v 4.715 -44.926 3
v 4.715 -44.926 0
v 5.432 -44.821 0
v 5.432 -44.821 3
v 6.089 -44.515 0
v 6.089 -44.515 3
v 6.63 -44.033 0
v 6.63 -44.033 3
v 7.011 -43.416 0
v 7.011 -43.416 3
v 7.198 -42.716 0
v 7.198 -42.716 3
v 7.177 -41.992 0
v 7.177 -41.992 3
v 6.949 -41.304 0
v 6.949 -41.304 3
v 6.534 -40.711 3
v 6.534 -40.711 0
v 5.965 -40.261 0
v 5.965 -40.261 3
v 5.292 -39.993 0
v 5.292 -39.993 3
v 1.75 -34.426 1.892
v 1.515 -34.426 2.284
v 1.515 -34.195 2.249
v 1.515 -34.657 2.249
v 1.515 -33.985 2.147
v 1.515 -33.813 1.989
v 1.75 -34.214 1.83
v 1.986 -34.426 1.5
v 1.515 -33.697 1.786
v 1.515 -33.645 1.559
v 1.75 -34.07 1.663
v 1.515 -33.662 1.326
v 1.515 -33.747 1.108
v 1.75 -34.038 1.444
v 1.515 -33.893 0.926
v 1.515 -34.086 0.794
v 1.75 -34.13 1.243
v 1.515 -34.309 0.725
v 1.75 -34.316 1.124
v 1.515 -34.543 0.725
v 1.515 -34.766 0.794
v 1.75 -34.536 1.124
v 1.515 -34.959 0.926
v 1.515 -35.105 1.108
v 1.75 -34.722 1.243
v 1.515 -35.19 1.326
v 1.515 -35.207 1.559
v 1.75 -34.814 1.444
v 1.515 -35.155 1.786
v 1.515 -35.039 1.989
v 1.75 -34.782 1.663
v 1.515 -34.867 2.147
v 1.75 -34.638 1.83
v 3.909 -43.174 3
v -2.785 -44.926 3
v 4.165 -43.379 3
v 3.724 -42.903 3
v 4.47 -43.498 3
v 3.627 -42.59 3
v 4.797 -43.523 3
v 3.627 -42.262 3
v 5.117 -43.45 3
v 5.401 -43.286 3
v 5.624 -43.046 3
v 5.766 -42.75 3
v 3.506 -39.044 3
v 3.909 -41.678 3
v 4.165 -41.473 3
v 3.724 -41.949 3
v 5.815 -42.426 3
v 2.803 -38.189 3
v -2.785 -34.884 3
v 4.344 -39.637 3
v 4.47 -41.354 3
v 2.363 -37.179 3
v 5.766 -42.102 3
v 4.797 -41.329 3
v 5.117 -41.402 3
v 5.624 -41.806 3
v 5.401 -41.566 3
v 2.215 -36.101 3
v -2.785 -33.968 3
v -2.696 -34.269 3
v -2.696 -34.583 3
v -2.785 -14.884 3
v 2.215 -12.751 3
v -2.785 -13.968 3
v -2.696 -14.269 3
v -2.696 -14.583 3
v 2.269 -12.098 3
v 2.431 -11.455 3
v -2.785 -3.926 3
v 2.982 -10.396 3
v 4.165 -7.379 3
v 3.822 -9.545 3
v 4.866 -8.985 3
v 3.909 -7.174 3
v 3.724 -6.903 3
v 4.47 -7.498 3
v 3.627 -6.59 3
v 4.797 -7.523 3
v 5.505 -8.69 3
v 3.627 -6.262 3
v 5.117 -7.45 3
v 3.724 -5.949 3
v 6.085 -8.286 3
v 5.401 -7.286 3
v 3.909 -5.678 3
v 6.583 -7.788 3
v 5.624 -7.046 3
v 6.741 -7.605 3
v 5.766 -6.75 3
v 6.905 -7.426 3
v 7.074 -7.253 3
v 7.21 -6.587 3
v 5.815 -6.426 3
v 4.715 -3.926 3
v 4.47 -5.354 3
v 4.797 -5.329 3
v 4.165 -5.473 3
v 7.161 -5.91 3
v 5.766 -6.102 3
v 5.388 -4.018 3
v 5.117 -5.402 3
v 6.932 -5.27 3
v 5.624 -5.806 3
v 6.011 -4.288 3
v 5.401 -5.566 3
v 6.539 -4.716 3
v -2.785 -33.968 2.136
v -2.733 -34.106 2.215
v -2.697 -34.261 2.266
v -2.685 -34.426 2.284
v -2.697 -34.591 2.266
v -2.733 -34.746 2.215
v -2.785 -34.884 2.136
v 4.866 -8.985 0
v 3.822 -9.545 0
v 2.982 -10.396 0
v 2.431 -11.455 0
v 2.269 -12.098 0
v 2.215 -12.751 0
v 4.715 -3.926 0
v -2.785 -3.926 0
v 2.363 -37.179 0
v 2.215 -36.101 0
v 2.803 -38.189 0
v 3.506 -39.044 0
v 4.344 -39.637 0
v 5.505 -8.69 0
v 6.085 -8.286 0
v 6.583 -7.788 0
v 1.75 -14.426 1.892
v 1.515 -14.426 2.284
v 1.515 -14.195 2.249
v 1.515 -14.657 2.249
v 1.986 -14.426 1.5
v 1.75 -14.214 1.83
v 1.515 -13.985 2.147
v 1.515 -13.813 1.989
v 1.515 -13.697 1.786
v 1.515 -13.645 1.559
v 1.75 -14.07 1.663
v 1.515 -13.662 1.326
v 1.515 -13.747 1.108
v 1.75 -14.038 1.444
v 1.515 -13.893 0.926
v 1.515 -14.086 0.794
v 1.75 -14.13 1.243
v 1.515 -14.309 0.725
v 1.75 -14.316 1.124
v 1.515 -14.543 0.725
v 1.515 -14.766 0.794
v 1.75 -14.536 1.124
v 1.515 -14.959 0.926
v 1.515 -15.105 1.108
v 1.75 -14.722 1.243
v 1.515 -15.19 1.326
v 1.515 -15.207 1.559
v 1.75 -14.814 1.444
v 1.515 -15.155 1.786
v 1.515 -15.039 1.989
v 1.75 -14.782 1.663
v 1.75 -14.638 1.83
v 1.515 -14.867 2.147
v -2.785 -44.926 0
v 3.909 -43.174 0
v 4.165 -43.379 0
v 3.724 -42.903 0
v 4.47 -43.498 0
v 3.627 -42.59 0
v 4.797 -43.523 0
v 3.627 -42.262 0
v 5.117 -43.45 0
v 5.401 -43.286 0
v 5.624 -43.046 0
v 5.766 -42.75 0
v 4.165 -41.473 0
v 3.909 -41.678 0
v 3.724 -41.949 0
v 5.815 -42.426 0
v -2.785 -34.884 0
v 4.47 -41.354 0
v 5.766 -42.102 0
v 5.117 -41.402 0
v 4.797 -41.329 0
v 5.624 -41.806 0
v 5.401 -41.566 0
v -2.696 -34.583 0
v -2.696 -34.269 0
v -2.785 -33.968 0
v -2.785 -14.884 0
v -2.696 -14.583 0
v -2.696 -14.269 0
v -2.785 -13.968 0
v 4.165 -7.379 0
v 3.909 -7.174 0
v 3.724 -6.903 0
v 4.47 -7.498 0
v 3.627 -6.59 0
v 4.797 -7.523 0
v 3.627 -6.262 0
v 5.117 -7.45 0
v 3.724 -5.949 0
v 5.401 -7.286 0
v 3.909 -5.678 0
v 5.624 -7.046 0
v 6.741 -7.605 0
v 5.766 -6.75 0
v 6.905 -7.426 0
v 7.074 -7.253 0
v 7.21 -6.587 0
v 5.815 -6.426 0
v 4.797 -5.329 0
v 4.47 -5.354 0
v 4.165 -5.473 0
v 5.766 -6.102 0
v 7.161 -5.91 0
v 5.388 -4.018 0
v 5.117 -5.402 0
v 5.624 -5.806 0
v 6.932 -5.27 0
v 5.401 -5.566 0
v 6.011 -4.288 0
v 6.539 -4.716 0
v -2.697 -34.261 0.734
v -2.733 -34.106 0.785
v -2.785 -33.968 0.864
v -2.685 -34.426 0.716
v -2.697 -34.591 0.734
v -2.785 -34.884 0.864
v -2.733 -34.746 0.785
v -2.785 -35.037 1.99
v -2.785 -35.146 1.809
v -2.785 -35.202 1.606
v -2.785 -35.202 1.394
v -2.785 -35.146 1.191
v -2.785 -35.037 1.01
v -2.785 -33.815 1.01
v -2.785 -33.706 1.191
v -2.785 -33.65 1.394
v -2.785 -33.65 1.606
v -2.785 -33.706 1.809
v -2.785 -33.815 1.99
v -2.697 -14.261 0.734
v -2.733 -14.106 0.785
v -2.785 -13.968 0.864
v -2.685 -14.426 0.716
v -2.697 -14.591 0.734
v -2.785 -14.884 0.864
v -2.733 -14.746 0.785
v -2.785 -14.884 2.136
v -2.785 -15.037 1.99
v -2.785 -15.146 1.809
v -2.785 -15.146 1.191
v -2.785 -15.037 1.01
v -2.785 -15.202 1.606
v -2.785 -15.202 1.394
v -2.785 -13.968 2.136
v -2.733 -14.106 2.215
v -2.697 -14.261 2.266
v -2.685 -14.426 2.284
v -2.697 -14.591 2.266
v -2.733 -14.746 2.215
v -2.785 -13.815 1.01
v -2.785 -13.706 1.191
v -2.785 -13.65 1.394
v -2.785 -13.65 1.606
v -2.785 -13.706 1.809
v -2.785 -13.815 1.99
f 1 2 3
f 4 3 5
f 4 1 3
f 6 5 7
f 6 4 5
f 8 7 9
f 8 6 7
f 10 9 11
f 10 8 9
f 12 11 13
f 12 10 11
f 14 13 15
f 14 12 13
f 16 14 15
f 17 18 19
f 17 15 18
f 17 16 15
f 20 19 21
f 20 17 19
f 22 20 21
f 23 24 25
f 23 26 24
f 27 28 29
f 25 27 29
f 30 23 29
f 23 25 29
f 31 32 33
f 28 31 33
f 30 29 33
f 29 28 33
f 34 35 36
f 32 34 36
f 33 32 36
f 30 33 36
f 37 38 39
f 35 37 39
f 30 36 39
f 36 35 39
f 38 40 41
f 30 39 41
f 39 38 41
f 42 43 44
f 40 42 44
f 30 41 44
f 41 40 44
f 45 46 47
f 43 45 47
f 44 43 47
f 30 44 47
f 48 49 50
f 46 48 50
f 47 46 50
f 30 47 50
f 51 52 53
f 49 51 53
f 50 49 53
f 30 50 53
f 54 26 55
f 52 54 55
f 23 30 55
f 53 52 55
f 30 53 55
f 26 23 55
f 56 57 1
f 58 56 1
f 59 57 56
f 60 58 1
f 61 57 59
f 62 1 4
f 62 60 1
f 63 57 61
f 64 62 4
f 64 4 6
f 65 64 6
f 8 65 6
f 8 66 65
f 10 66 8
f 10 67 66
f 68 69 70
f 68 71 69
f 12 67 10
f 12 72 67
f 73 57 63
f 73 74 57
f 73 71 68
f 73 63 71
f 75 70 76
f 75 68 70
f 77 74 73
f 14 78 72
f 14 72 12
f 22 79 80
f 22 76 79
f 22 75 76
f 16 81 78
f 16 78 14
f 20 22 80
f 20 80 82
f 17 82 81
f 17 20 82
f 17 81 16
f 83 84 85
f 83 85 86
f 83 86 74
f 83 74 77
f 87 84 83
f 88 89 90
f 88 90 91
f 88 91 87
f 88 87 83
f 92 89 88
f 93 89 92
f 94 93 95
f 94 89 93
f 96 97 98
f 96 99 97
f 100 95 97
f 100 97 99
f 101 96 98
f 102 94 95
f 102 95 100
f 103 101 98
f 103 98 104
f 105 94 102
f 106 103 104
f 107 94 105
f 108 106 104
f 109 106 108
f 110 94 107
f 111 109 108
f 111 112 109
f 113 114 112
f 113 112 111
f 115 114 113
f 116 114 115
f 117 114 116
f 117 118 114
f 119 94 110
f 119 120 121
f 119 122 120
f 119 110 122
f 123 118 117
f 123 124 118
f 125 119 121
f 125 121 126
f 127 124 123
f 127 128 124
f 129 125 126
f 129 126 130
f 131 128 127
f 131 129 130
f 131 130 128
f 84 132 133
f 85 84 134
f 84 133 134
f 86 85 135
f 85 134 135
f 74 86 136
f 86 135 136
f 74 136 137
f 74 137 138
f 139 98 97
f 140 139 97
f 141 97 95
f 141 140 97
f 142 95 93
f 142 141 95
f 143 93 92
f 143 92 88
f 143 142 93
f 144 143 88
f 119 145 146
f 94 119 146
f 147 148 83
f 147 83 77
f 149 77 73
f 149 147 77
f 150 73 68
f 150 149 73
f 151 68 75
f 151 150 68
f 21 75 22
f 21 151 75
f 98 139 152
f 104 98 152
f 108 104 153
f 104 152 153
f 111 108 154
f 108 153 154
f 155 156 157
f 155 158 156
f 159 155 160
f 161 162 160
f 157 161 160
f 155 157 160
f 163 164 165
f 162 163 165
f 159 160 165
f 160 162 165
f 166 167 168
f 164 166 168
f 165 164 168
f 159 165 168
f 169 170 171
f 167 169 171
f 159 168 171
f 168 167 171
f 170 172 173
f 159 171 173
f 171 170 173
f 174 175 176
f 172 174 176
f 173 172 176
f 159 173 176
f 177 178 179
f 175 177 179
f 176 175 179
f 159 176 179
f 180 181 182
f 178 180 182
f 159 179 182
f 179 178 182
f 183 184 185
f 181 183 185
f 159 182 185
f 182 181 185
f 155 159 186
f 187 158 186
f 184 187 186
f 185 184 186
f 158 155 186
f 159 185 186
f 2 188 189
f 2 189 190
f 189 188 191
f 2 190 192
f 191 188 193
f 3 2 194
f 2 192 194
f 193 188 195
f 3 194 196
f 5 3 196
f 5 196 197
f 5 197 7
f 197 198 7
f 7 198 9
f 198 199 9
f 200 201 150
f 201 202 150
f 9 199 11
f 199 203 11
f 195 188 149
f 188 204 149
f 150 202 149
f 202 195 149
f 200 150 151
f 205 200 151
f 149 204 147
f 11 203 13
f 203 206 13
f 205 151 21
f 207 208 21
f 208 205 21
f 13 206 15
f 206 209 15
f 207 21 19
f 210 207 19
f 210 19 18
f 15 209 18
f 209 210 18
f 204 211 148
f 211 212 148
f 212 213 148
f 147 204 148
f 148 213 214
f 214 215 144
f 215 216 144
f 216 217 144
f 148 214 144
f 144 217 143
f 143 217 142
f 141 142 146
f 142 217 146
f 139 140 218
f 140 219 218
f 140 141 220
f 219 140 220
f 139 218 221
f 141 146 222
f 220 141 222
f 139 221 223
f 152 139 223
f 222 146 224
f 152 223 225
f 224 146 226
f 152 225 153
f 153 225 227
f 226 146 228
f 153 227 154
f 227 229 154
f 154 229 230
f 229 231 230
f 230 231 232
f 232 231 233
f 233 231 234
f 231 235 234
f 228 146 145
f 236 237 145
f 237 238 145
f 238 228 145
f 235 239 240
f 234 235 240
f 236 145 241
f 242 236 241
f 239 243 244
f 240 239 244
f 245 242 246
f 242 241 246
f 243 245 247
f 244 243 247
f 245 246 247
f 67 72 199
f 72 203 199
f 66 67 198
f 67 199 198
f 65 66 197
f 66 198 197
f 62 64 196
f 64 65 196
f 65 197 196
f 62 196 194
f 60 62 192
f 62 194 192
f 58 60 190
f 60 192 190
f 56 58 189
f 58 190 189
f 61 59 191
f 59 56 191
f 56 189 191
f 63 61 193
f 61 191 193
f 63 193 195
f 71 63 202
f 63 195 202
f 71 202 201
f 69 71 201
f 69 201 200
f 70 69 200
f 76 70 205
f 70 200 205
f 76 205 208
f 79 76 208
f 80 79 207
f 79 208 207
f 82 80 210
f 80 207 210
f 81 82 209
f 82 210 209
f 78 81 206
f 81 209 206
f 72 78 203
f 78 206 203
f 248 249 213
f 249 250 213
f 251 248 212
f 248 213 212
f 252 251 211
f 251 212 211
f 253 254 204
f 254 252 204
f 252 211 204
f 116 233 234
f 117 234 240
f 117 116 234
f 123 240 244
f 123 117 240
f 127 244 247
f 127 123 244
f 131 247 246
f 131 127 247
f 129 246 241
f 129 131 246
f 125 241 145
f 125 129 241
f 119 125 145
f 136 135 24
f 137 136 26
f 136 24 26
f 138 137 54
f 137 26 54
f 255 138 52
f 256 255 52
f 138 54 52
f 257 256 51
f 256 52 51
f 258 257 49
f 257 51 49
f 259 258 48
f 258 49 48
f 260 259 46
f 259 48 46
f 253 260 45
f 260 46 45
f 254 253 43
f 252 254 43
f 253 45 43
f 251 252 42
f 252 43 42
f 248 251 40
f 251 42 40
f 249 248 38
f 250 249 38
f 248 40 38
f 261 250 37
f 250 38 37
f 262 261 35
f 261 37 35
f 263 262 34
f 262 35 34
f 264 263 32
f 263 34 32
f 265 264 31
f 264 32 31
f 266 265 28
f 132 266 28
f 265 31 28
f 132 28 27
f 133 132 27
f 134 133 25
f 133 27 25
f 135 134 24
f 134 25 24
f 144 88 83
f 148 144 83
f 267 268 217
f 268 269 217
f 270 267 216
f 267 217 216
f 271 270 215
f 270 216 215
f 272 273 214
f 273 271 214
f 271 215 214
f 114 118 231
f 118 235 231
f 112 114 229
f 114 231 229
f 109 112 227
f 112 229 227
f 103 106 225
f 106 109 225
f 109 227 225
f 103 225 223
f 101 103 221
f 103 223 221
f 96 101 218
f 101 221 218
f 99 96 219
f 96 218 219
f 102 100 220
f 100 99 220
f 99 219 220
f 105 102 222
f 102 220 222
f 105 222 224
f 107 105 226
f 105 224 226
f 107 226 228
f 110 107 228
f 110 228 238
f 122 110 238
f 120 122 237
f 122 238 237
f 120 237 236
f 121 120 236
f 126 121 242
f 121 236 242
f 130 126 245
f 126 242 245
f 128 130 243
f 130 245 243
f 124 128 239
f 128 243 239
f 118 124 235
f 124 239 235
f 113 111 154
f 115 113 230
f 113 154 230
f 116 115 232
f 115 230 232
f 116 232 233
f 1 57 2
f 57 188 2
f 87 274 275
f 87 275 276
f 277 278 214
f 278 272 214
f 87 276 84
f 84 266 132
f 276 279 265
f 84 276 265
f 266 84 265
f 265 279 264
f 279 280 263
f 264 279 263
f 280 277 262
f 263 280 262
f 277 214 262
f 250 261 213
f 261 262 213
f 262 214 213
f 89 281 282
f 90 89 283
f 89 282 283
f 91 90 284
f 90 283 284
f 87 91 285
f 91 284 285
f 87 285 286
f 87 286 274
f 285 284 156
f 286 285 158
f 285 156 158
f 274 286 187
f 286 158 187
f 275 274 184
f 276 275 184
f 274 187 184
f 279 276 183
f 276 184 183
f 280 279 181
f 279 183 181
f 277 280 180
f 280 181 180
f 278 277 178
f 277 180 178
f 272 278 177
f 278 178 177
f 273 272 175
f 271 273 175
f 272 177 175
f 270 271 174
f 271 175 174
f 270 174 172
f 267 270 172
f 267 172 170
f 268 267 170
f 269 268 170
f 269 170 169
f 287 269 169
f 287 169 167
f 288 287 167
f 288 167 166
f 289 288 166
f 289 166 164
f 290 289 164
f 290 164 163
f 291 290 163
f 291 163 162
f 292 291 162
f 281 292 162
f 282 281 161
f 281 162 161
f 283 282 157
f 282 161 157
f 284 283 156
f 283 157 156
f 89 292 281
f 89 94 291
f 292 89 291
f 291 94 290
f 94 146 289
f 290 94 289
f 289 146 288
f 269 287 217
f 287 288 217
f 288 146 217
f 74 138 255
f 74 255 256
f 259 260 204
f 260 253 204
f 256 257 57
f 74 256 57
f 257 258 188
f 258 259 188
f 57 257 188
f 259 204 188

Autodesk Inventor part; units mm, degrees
ref_plane "YZ Plane" through (0, 0, 0) normal (1, 0, 0) x (0, 1, 0)
ref_plane "XZ Plane" through (0, 0, 0) normal (0, 1, 0) x (-1, 0, 0)
ref_plane "XY Plane" through (0, 0, 0) normal (0, 0, 1) x (1, 0, 0)
sketch "スケッチ1" plane through (0, 0, 0) normal (0, 0, 1) x (1, 0, 0)
  line L0 (22.7151, -43.926) -> (22.7151, -4.926) construction
  arc A0 (22.2151, -44.426) -> (22.7151, -43.926) centre (22.2151, -43.926) ccw construction
  line L1 (3.2151, -44.426) -> (22.2151, -44.426) construction
  arc A1 (2.7151, -43.926) -> (3.2151, -44.426) centre (3.2151, -43.926) ccw construction
  line L2 (2.7151, -4.926) -> (2.7151, -43.926) construction
  arc A2 (3.2151, -4.426) -> (2.7151, -4.926) centre (3.2151, -4.926) ccw construction
  line L3 (22.2151, -4.426) -> (3.2151, -4.426) construction
  arc A3 (22.7151, -4.926) -> (22.2151, -4.426) centre (22.2151, -4.926) ccw construction
  line L4 (6.2865, -24.2474) -> (6.2865, -30.6046) construction
  line L5 (6.2865, -30.6046) -> (10.1437, -30.6046) construction
  line L6 (10.1437, -30.6046) -> (10.1437, -24.2474) construction
  line L7 (10.1437, -24.2474) -> (6.2865, -24.2474) construction
  circle A4 centre (12.7151, -31.826) radius 1.1519 construction
  line L8 (19.1437, -24.2474) -> (15.2865, -24.2474) construction
  line L9 (15.2865, -24.2474) -> (15.2865, -30.6046) construction
  line L10 (15.2865, -30.6046) -> (19.1437, -30.6046) construction
  line L11 (19.1437, -30.6046) -> (19.1437, -24.2474) construction
  circle A5 centre (4.7151, -6.426) radius 1.8131 construction
  circle A6 centre (20.7151, -6.426) radius 1.8131 construction
  circle A7 centre (4.7151, -42.426) radius 1.8131 construction
  circle A8 centre (20.7151, -42.426) radius 1.8131 construction
  arc A9 (18.9651, -12.926) -> (6.4651, -12.9153) centre (12.7151, -12.926) ccw construction
  arc A10 (6.4649, -12.9153) -> (6.2151, -12.676) centre (6.2151, -12.926) ccw construction
  line L12 (6.2151, -12.676) -> (4.4651, -12.676) construction
  arc A11 (4.4651, -12.676) -> (4.4651, -13.176) centre (4.4651, -12.926) ccw construction
  line L13 (4.4651, -13.176) -> (6.2151, -13.176) construction
  arc A12 (6.2151, -13.176) -> (6.4651, -12.926) centre (6.2151, -12.926) ccw construction
  arc A13 (6.4651, -12.926) -> (6.9408, -15.3178) centre (12.7151, -12.926) ccw construction
  arc A14 (6.9408, -15.3178) -> (6.6142, -15.1825) centre (6.7099, -15.4134) ccw construction
  line L14 (6.6142, -15.1825) -> (4.9974, -15.8522) construction
  arc A15 (4.9974, -15.8522) -> (5.1888, -16.3141) centre (5.0931, -16.0831) ccw construction
  line L15 (5.1888, -16.3141) -> (6.8055, -15.6444) construction
  arc A16 (6.8055, -15.6444) -> (6.9408, -15.3178) centre (6.7099, -15.4134) ccw construction
  arc A17 (6.9408, -15.3178) -> (8.2957, -17.3454) centre (12.7151, -12.926) ccw construction
  arc A18 (8.2957, -17.3454) -> (7.9421, -17.3454) centre (8.1189, -17.5222) ccw construction
  line L16 (7.9421, -17.3454) -> (6.7047, -18.5829) construction
  arc A19 (6.7047, -18.5829) -> (7.0582, -18.9364) centre (6.8815, -18.7596) ccw construction
  line L17 (7.0582, -18.9364) -> (8.2957, -17.699) construction
  arc A20 (8.2957, -17.699) -> (8.2957, -17.3454) centre (8.1189, -17.5222) ccw construction
  arc A21 (8.2957, -17.3454) -> (10.3233, -18.7003) centre (12.7151, -12.926) ccw construction
  arc A22 (10.3233, -18.7003) -> (9.9967, -18.8356) centre (10.2277, -18.9312) ccw construction
  line L18 (9.9967, -18.8356) -> (9.327, -20.4523) construction
  arc A23 (9.327, -20.4523) -> (9.7889, -20.6437) centre (9.558, -20.548) ccw construction
  line L19 (9.7889, -20.6437) -> (10.4586, -19.0269) construction
  arc A24 (10.4586, -19.0269) -> (10.3233, -18.7003) centre (10.2277, -18.9312) ccw construction
  arc A25 (10.3233, -18.7003) -> (12.7151, -19.176) centre (12.7151, -12.926) ccw construction
  arc A26 (12.7151, -19.176) -> (12.4651, -19.426) centre (12.7151, -19.426) ccw construction
  line L20 (12.4651, -19.426) -> (12.4651, -21.176) construction
  arc A27 (12.4651, -21.176) -> (12.9651, -21.176) centre (12.7151, -21.176) ccw construction
  line L21 (12.9651, -21.176) -> (12.9651, -19.426) construction
  arc A28 (12.9651, -19.426) -> (12.7151, -19.176) centre (12.7151, -19.426) ccw construction
  arc A29 (12.7151, -19.176) -> (15.1069, -18.7003) centre (12.7151, -12.926) ccw construction
  arc A30 (15.1069, -18.7003) -> (14.9716, -19.0269) centre (15.2025, -18.9312) ccw construction
  line L22 (14.9716, -19.0269) -> (15.6413, -20.6437) construction
  arc A31 (15.6413, -20.6437) -> (16.1032, -20.4523) centre (15.8722, -20.548) ccw construction
  line L23 (16.1032, -20.4523) -> (15.4335, -18.8356) construction
  arc A32 (15.4335, -18.8356) -> (15.1069, -18.7003) centre (15.2025, -18.9312) ccw construction
  arc A33 (15.1069, -18.7003) -> (17.1345, -17.3454) centre (12.7151, -12.926) ccw construction
  arc A34 (17.1345, -17.3454) -> (17.1345, -17.699) centre (17.3113, -17.5222) ccw construction
  line L24 (17.1345, -17.699) -> (18.3719, -18.9364) construction
  arc A35 (18.3719, -18.9364) -> (18.7255, -18.5829) centre (18.5487, -18.7596) ccw construction
  line L25 (18.7255, -18.5829) -> (17.4881, -17.3454) construction
  arc A36 (17.4881, -17.3454) -> (17.1345, -17.3454) centre (17.3113, -17.5222) ccw construction
  arc A37 (17.1345, -17.3454) -> (18.4893, -15.3178) centre (12.7151, -12.926) ccw construction
  arc A38 (18.4893, -15.3178) -> (18.6246, -15.6444) centre (18.7203, -15.4134) ccw construction
  line L26 (18.6246, -15.6444) -> (20.2414, -16.3141) construction
  arc A39 (20.2414, -16.3141) -> (20.4328, -15.8522) centre (20.3371, -16.0831) ccw construction
  line L27 (20.4328, -15.8522) -> (18.816, -15.1825) construction
  arc A40 (18.816, -15.1825) -> (18.4893, -15.3178) centre (18.7203, -15.4134) ccw construction
  arc A41 (18.4893, -15.3178) -> (18.9651, -12.926) centre (12.7151, -12.926) ccw construction
  arc A42 (18.9651, -12.926) -> (19.2151, -13.176) centre (19.2151, -12.926) ccw construction
  line L28 (19.2151, -13.176) -> (20.9651, -13.176) construction
  arc A43 (20.9651, -13.176) -> (20.9651, -12.676) centre (20.9651, -12.926) ccw construction
  line L29 (20.9651, -12.676) -> (19.2151, -12.676) construction
  arc A44 (19.2151, -12.676) -> (18.9651, -12.926) centre (19.2151, -12.926) ccw construction
  circle A45 centre (4.7151, -6.426) radius 1.1
  circle A46 centre (4.7151, -42.426) radius 1.1
  circle A47 centre (4.7151, -6.426) radius 2.5
  circle A48 centre (4.7151, -42.426) radius 2.5
  circle A49 centre (12.7151, -12.926) radius 8 construction
  circle A50 centre (12.7151, -12.926) radius 8
  line L30 (12.1437, -22.2474) -> (12.1437, -32.6046)
  line L31 (12.1437, -32.6046) -> (4.2865, -32.6046)
  line L32 (4.2865, -32.6046) -> (4.2865, -22.2474)
  line L33 (4.2865, -22.2474) -> (12.1437, -22.2474)
  line L34 (7.2151, -6.426) -> (7.2151, -42.426)
  line L35 (4.7151, -3.926) -> (-2.7849, -3.926)
  line L36 (-2.7849, -3.926) -> (-2.7849, -44.926)
  line L37 (-2.7849, -44.926) -> (4.7151, -44.926)
  circle A51 centre (-3.7849, -14.426) radius 1.1
  line L38 (7.2151, -24.426) -> (-2.7849, -24.426) construction
  circle A52 centre (-3.7849, -34.426) radius 1.1
  point P0 (0, 0)
  point P1 (7.0743, -7.2531)
  point P2 (-2.7849, -13.9677)
  point P3 (-2.7849, -14.8843)
  point P4 (-2.7849, -33.9677)
  point P5 (-2.7849, -34.8843)
  point P6 (7.2151, -32.6046)
  point P7 (7.2151, -22.2474)
  point P8 (7.2151, -18.7355)
  point P9 (7.2151, -7.1165)
  dimension "d0" = 2.2
  dimension "d1" = 2.2
  dimension "d3" = 5
  dimension "d4" = 5
  dimension "d5" = 2
  dimension "d6" = 10
  dimension "d7" = 2.2
  dimension "d8" = 1
  dimension "d9" = 10
extrude "押し出し1" add sketch "スケッチ1" along normal blind 3 contours A47 A50 | L34 A50 A47 | A47 A50 L34 L33 L32 L31 A48 L37 L36 A52 A51 L35 | A48 picked at (5.5204, -8.2788) picked at (7.1889, -6.9354)
fillet "フィレット1" radius 2 4 edges at (7.2151, -22.2474, 1.5) (7.2151, -32.6046, 1.5) (4.2865, -32.6046, 1.5) (4.2865, -22.2474, 1.5)
sketch "スケッチ2" plane through (-2.7849, -33.9677, 0) normal (-1, 0, 0) x (0, 0, 1)
  line L0 (0, 20) -> (3, 20) projected
  line L1 (3, 20) -> (3, 19.0835) projected
  line L2 (3, 0) -> (3, -0.9165) projected
  point P0 (0, 33.9677)
  point P1 (1.5, 19.5417)
  point P2 (1.5, 20)
  point P3 (3, 19.5417)
  point P4 (1.5, -0.4583)
  point P5 (3, -0.4583)
hole "穴1" at (-2.7849, -14.426, 1.5) at (-2.7849, -34.426, 1.5) direction (1, 0, 0) diameter 1.567 depth 4.3 tip angle 118 thread size "M2x0.4" class "6H" standard "ISO Metric profile"
sketch "スケッチ3" plane through (0, 0, 3) normal (0, 0, 1) x (1, 0, 0)
  circle A0 centre (4.7151, -6.426) radius 1.1 projected
  arc A1 (7.2151, -6.426) -> (4.7151, -3.926) centre (4.7151, -6.426) ccw projected
  circle A2 centre (4.7151, -42.426) radius 1.1 projected
  arc A3 (4.7151, -44.926) -> (7.2151, -42.426) centre (4.7151, -42.426) ccw projected
  circle A4 centre (4.7151, -42.426) radius 2.5
  line L0 (4.7151, -8.926) -> (2.2151, -8.926)
  line L1 (2.2151, -8.926) -> (2.2151, -39.926)
  line L2 (2.2151, -39.926) -> (4.7151, -39.926)
  line L3 (-2.7849, -3.926) -> (-2.7849, -44.926) projected
  arc A5 (5.7508, -22.1743) -> (7.2151, -20.2474) centre (5.2151, -20.2474) ccw projected
  line L4 (7.2151, -20.2474) -> (7.2151, -18.7355) projected
  arc A6 (7.2151, -6.426) -> (4.7151, -3.926) centre (4.7151, -6.426) ccw projected
  line L5 (4.7151, -3.926) -> (-2.7849, -3.926) projected
  line L6 (-2.7849, -3.926) -> (-2.7849, -13.9677) projected
  line L7 (-2.7849, -44.926) -> (4.7151, -44.926) projected
  arc A7 (4.7151, -44.926) -> (7.2151, -42.426) centre (4.7151, -42.426) ccw projected
  line L8 (7.2151, -42.426) -> (7.2151, -34.6046) projected
  arc A8 (7.2151, -34.6046) -> (5.7508, -32.6777) centre (5.2151, -34.6046) ccw projected
  circle A9 centre (4.7151, -42.426) radius 1.1 projected
  circle A10 centre (4.7151, -6.426) radius 1.1 projected
  line L9 (4.2865, -30.7508) -> (4.2865, -24.1012) projected
  arc A11 (5.7508, -22.1743) -> (4.2865, -24.1012) centre (6.2865, -24.1012) ccw projected
  arc A12 (4.2865, -30.7508) -> (5.7508, -32.6777) centre (6.2865, -30.7508) ccw projected
  arc A13 (-2.7849, -14.8843) -> (-2.7849, -13.9677) centre (-3.7849, -14.426) ccw projected
  line L10 (-2.7849, -14.8843) -> (-2.7849, -33.9677) projected
  arc A14 (-2.7849, -34.8843) -> (-2.7849, -33.9677) centre (-3.7849, -34.426) ccw projected
  line L11 (-2.7849, -34.8843) -> (-2.7849, -44.926) projected
  circle A15 centre (4.7151, -6.426) radius 2.5
  arc A16 (7.2151, -7.1165) -> (7.2151, -18.7355) centre (12.7151, -12.926) ccw projected
  line L12 (7.2151, -7.1165) -> (7.2151, -6.426) projected
  point P0 (0, 0)
  point P1 (7.0743, -7.2531)
  point P2 (-2.7849, -14.8843)
  point P3 (-2.7849, -34.8843)
  point P4 (7.0743, -7.2531)
  point P5 (6.0077, -8.5659)
  dimension "d20" = 5
extrude "押し出し2" cut sketch "スケッチ3" against normal through all contours A0 | L12 A16 A15 | A15 A16 L4 A5 A11 L9 A12 A8 L8 A4 L2 L1 L0 | A13 L3 | A14 L3
fillet "フィレット2" radius 4 2 edges at (2.2151, -8.926, 1.5) (2.2151, -39.926, 1.5)
fillet "フィレット3" radius 4 1 edges at (6.0077, -8.5659, 1.5)
properties part number "asikubi_asi" material "アルミニウム 2014-T4"
